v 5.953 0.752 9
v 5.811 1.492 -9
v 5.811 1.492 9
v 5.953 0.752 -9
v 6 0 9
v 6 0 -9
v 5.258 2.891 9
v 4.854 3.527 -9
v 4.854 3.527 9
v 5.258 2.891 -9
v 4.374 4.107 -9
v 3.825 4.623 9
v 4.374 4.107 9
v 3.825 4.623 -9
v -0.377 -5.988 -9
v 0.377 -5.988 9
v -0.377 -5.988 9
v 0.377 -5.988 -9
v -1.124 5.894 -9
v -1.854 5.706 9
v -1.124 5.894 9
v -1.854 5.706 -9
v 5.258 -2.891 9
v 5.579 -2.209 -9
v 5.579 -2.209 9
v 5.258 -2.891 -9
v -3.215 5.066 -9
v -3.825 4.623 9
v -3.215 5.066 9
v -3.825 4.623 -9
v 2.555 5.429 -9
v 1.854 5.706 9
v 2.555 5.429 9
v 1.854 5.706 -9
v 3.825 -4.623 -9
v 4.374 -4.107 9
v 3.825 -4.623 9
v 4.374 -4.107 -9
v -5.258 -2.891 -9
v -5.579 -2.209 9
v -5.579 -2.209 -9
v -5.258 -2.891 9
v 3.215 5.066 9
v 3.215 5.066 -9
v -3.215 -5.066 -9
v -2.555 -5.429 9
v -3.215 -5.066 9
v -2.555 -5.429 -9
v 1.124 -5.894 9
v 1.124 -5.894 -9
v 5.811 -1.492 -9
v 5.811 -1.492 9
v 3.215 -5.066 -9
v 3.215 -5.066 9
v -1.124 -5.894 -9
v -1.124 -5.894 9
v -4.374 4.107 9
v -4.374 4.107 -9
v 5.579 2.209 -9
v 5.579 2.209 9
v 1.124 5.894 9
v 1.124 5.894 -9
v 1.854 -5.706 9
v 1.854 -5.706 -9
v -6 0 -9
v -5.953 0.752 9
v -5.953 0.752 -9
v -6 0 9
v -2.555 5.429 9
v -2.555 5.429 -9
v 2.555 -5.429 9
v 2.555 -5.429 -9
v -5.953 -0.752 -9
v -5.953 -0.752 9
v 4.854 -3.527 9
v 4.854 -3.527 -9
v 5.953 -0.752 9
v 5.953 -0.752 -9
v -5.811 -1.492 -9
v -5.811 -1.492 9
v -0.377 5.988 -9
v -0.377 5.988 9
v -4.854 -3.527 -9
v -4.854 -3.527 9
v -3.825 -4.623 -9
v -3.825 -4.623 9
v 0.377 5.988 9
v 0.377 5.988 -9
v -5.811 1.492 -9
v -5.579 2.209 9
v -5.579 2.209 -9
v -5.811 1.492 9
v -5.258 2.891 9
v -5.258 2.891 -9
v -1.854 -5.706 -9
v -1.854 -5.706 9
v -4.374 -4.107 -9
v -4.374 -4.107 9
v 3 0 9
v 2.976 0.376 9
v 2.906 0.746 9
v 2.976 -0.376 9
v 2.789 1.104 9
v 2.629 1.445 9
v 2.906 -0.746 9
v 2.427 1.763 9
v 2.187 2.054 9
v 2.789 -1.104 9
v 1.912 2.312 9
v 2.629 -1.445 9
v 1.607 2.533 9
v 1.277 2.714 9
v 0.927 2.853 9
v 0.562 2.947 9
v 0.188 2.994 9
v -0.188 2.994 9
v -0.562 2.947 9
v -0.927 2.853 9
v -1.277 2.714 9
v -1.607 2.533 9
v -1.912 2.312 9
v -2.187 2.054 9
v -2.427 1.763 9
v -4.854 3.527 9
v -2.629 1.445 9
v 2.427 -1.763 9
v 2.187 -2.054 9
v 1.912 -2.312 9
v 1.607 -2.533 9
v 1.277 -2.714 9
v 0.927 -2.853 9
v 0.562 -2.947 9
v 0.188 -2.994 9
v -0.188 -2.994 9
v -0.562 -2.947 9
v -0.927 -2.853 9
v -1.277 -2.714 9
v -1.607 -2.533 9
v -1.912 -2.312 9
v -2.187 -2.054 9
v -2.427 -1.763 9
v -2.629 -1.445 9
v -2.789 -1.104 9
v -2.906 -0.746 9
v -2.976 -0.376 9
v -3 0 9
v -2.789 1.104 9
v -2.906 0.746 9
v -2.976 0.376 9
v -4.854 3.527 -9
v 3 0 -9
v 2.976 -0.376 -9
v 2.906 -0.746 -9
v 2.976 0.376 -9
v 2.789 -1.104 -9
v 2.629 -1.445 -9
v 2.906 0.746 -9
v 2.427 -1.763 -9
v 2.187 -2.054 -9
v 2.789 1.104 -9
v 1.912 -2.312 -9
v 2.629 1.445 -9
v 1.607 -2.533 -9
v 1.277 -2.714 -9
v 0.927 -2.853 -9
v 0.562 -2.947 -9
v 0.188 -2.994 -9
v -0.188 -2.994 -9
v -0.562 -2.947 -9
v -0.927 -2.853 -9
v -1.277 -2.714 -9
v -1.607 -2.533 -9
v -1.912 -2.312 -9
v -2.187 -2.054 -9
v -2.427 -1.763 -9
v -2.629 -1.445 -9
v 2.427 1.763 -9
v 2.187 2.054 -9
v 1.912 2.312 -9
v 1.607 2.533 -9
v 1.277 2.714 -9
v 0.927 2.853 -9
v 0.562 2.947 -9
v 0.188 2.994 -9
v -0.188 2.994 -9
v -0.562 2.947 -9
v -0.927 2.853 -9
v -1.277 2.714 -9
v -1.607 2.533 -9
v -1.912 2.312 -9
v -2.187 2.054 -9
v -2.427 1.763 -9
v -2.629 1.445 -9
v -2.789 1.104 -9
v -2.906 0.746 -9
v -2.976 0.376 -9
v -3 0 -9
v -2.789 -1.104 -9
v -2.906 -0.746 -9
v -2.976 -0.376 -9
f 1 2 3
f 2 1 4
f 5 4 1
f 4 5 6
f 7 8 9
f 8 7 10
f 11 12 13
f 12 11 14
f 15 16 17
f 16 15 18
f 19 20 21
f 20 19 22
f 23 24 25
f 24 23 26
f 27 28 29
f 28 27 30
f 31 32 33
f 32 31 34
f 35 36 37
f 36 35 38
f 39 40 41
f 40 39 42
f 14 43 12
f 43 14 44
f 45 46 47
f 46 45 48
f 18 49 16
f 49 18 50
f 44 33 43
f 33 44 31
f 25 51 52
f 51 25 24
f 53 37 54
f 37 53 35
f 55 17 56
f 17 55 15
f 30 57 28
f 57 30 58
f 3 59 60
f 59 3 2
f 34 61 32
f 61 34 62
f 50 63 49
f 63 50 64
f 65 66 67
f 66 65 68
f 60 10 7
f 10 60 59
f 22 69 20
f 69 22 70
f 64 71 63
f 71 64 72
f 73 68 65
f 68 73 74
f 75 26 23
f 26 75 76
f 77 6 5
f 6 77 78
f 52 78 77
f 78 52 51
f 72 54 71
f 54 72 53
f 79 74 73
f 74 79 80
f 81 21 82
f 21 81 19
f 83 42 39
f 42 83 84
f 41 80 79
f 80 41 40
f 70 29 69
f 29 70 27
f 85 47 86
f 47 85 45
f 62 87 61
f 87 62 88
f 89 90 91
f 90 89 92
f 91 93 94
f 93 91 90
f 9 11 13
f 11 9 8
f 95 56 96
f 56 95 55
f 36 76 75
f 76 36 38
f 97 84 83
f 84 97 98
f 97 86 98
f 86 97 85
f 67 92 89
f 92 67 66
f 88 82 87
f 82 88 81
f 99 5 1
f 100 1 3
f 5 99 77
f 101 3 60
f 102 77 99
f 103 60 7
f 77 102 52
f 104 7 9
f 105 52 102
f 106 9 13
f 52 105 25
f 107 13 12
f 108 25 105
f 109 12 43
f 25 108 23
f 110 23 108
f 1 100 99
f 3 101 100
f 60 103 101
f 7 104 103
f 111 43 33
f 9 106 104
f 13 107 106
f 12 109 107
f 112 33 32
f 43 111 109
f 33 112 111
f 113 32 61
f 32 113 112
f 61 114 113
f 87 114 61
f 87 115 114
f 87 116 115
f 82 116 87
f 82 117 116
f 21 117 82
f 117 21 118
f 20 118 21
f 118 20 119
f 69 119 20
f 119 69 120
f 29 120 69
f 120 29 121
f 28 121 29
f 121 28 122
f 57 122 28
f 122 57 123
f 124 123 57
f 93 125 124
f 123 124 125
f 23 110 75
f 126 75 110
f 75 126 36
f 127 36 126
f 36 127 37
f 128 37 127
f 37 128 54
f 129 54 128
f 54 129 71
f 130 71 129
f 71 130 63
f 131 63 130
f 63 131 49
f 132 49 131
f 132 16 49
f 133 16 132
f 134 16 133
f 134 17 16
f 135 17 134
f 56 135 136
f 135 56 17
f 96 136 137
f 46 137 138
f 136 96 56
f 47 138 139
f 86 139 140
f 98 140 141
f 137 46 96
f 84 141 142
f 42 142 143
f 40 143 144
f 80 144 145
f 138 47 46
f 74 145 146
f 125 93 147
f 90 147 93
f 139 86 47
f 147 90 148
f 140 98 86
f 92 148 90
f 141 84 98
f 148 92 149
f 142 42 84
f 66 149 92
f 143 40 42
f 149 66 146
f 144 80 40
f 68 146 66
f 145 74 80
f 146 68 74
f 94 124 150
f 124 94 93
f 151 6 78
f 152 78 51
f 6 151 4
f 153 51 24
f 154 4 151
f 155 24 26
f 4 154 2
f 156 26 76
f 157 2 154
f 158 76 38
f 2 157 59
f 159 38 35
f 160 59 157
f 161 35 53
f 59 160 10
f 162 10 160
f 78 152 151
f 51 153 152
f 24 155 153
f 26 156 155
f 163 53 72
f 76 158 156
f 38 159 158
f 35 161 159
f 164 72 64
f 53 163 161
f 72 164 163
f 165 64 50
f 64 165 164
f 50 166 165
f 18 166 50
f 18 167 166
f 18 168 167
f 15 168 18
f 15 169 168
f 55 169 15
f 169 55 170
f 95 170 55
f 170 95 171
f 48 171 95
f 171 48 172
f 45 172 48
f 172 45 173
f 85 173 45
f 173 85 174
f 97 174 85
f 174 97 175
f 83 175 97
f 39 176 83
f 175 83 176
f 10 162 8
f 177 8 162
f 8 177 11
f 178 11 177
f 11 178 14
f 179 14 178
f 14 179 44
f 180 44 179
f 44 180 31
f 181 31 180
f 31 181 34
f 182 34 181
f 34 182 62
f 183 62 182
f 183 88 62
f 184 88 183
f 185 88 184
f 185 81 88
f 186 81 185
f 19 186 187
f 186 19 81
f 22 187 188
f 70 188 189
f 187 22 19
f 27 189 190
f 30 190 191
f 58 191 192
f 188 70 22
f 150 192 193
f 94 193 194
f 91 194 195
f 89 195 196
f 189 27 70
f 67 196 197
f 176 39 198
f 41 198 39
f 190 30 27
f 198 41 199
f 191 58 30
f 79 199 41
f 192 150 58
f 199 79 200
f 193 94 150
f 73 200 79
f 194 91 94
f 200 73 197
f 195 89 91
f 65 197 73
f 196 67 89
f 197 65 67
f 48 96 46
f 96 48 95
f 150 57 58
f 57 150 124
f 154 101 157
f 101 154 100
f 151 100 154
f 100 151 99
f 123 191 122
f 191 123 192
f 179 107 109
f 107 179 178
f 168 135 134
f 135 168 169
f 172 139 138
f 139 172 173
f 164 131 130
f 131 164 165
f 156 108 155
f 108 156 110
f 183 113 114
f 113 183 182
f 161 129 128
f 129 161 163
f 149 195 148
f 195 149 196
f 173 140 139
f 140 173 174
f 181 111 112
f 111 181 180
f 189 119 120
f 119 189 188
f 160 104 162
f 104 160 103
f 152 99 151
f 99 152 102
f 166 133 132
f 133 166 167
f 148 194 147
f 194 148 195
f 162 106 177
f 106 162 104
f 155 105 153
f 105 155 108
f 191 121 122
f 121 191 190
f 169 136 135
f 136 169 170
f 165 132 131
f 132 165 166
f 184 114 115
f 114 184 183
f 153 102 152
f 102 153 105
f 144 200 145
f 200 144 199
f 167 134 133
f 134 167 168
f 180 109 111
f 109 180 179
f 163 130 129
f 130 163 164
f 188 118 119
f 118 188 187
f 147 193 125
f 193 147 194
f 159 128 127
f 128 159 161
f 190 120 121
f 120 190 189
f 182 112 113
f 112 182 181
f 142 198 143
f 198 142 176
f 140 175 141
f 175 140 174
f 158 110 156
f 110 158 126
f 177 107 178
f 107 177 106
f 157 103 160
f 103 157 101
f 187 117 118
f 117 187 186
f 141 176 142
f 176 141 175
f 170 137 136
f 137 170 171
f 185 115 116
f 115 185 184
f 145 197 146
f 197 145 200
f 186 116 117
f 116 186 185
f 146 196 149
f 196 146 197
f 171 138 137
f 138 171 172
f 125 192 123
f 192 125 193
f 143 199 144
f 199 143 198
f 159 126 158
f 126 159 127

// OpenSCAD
$fn = 50;


difference() {
	union() {
		translate(v = [0, 0, -9.0000000000]) {
			cylinder(h = 18, r = 6.0000000000);
		}
	}
	union() {
		translate(v = [0, 0, -100.0000000000]) {
			cylinder(h = 200, r = 3.0000000000);
		}
	}
}
